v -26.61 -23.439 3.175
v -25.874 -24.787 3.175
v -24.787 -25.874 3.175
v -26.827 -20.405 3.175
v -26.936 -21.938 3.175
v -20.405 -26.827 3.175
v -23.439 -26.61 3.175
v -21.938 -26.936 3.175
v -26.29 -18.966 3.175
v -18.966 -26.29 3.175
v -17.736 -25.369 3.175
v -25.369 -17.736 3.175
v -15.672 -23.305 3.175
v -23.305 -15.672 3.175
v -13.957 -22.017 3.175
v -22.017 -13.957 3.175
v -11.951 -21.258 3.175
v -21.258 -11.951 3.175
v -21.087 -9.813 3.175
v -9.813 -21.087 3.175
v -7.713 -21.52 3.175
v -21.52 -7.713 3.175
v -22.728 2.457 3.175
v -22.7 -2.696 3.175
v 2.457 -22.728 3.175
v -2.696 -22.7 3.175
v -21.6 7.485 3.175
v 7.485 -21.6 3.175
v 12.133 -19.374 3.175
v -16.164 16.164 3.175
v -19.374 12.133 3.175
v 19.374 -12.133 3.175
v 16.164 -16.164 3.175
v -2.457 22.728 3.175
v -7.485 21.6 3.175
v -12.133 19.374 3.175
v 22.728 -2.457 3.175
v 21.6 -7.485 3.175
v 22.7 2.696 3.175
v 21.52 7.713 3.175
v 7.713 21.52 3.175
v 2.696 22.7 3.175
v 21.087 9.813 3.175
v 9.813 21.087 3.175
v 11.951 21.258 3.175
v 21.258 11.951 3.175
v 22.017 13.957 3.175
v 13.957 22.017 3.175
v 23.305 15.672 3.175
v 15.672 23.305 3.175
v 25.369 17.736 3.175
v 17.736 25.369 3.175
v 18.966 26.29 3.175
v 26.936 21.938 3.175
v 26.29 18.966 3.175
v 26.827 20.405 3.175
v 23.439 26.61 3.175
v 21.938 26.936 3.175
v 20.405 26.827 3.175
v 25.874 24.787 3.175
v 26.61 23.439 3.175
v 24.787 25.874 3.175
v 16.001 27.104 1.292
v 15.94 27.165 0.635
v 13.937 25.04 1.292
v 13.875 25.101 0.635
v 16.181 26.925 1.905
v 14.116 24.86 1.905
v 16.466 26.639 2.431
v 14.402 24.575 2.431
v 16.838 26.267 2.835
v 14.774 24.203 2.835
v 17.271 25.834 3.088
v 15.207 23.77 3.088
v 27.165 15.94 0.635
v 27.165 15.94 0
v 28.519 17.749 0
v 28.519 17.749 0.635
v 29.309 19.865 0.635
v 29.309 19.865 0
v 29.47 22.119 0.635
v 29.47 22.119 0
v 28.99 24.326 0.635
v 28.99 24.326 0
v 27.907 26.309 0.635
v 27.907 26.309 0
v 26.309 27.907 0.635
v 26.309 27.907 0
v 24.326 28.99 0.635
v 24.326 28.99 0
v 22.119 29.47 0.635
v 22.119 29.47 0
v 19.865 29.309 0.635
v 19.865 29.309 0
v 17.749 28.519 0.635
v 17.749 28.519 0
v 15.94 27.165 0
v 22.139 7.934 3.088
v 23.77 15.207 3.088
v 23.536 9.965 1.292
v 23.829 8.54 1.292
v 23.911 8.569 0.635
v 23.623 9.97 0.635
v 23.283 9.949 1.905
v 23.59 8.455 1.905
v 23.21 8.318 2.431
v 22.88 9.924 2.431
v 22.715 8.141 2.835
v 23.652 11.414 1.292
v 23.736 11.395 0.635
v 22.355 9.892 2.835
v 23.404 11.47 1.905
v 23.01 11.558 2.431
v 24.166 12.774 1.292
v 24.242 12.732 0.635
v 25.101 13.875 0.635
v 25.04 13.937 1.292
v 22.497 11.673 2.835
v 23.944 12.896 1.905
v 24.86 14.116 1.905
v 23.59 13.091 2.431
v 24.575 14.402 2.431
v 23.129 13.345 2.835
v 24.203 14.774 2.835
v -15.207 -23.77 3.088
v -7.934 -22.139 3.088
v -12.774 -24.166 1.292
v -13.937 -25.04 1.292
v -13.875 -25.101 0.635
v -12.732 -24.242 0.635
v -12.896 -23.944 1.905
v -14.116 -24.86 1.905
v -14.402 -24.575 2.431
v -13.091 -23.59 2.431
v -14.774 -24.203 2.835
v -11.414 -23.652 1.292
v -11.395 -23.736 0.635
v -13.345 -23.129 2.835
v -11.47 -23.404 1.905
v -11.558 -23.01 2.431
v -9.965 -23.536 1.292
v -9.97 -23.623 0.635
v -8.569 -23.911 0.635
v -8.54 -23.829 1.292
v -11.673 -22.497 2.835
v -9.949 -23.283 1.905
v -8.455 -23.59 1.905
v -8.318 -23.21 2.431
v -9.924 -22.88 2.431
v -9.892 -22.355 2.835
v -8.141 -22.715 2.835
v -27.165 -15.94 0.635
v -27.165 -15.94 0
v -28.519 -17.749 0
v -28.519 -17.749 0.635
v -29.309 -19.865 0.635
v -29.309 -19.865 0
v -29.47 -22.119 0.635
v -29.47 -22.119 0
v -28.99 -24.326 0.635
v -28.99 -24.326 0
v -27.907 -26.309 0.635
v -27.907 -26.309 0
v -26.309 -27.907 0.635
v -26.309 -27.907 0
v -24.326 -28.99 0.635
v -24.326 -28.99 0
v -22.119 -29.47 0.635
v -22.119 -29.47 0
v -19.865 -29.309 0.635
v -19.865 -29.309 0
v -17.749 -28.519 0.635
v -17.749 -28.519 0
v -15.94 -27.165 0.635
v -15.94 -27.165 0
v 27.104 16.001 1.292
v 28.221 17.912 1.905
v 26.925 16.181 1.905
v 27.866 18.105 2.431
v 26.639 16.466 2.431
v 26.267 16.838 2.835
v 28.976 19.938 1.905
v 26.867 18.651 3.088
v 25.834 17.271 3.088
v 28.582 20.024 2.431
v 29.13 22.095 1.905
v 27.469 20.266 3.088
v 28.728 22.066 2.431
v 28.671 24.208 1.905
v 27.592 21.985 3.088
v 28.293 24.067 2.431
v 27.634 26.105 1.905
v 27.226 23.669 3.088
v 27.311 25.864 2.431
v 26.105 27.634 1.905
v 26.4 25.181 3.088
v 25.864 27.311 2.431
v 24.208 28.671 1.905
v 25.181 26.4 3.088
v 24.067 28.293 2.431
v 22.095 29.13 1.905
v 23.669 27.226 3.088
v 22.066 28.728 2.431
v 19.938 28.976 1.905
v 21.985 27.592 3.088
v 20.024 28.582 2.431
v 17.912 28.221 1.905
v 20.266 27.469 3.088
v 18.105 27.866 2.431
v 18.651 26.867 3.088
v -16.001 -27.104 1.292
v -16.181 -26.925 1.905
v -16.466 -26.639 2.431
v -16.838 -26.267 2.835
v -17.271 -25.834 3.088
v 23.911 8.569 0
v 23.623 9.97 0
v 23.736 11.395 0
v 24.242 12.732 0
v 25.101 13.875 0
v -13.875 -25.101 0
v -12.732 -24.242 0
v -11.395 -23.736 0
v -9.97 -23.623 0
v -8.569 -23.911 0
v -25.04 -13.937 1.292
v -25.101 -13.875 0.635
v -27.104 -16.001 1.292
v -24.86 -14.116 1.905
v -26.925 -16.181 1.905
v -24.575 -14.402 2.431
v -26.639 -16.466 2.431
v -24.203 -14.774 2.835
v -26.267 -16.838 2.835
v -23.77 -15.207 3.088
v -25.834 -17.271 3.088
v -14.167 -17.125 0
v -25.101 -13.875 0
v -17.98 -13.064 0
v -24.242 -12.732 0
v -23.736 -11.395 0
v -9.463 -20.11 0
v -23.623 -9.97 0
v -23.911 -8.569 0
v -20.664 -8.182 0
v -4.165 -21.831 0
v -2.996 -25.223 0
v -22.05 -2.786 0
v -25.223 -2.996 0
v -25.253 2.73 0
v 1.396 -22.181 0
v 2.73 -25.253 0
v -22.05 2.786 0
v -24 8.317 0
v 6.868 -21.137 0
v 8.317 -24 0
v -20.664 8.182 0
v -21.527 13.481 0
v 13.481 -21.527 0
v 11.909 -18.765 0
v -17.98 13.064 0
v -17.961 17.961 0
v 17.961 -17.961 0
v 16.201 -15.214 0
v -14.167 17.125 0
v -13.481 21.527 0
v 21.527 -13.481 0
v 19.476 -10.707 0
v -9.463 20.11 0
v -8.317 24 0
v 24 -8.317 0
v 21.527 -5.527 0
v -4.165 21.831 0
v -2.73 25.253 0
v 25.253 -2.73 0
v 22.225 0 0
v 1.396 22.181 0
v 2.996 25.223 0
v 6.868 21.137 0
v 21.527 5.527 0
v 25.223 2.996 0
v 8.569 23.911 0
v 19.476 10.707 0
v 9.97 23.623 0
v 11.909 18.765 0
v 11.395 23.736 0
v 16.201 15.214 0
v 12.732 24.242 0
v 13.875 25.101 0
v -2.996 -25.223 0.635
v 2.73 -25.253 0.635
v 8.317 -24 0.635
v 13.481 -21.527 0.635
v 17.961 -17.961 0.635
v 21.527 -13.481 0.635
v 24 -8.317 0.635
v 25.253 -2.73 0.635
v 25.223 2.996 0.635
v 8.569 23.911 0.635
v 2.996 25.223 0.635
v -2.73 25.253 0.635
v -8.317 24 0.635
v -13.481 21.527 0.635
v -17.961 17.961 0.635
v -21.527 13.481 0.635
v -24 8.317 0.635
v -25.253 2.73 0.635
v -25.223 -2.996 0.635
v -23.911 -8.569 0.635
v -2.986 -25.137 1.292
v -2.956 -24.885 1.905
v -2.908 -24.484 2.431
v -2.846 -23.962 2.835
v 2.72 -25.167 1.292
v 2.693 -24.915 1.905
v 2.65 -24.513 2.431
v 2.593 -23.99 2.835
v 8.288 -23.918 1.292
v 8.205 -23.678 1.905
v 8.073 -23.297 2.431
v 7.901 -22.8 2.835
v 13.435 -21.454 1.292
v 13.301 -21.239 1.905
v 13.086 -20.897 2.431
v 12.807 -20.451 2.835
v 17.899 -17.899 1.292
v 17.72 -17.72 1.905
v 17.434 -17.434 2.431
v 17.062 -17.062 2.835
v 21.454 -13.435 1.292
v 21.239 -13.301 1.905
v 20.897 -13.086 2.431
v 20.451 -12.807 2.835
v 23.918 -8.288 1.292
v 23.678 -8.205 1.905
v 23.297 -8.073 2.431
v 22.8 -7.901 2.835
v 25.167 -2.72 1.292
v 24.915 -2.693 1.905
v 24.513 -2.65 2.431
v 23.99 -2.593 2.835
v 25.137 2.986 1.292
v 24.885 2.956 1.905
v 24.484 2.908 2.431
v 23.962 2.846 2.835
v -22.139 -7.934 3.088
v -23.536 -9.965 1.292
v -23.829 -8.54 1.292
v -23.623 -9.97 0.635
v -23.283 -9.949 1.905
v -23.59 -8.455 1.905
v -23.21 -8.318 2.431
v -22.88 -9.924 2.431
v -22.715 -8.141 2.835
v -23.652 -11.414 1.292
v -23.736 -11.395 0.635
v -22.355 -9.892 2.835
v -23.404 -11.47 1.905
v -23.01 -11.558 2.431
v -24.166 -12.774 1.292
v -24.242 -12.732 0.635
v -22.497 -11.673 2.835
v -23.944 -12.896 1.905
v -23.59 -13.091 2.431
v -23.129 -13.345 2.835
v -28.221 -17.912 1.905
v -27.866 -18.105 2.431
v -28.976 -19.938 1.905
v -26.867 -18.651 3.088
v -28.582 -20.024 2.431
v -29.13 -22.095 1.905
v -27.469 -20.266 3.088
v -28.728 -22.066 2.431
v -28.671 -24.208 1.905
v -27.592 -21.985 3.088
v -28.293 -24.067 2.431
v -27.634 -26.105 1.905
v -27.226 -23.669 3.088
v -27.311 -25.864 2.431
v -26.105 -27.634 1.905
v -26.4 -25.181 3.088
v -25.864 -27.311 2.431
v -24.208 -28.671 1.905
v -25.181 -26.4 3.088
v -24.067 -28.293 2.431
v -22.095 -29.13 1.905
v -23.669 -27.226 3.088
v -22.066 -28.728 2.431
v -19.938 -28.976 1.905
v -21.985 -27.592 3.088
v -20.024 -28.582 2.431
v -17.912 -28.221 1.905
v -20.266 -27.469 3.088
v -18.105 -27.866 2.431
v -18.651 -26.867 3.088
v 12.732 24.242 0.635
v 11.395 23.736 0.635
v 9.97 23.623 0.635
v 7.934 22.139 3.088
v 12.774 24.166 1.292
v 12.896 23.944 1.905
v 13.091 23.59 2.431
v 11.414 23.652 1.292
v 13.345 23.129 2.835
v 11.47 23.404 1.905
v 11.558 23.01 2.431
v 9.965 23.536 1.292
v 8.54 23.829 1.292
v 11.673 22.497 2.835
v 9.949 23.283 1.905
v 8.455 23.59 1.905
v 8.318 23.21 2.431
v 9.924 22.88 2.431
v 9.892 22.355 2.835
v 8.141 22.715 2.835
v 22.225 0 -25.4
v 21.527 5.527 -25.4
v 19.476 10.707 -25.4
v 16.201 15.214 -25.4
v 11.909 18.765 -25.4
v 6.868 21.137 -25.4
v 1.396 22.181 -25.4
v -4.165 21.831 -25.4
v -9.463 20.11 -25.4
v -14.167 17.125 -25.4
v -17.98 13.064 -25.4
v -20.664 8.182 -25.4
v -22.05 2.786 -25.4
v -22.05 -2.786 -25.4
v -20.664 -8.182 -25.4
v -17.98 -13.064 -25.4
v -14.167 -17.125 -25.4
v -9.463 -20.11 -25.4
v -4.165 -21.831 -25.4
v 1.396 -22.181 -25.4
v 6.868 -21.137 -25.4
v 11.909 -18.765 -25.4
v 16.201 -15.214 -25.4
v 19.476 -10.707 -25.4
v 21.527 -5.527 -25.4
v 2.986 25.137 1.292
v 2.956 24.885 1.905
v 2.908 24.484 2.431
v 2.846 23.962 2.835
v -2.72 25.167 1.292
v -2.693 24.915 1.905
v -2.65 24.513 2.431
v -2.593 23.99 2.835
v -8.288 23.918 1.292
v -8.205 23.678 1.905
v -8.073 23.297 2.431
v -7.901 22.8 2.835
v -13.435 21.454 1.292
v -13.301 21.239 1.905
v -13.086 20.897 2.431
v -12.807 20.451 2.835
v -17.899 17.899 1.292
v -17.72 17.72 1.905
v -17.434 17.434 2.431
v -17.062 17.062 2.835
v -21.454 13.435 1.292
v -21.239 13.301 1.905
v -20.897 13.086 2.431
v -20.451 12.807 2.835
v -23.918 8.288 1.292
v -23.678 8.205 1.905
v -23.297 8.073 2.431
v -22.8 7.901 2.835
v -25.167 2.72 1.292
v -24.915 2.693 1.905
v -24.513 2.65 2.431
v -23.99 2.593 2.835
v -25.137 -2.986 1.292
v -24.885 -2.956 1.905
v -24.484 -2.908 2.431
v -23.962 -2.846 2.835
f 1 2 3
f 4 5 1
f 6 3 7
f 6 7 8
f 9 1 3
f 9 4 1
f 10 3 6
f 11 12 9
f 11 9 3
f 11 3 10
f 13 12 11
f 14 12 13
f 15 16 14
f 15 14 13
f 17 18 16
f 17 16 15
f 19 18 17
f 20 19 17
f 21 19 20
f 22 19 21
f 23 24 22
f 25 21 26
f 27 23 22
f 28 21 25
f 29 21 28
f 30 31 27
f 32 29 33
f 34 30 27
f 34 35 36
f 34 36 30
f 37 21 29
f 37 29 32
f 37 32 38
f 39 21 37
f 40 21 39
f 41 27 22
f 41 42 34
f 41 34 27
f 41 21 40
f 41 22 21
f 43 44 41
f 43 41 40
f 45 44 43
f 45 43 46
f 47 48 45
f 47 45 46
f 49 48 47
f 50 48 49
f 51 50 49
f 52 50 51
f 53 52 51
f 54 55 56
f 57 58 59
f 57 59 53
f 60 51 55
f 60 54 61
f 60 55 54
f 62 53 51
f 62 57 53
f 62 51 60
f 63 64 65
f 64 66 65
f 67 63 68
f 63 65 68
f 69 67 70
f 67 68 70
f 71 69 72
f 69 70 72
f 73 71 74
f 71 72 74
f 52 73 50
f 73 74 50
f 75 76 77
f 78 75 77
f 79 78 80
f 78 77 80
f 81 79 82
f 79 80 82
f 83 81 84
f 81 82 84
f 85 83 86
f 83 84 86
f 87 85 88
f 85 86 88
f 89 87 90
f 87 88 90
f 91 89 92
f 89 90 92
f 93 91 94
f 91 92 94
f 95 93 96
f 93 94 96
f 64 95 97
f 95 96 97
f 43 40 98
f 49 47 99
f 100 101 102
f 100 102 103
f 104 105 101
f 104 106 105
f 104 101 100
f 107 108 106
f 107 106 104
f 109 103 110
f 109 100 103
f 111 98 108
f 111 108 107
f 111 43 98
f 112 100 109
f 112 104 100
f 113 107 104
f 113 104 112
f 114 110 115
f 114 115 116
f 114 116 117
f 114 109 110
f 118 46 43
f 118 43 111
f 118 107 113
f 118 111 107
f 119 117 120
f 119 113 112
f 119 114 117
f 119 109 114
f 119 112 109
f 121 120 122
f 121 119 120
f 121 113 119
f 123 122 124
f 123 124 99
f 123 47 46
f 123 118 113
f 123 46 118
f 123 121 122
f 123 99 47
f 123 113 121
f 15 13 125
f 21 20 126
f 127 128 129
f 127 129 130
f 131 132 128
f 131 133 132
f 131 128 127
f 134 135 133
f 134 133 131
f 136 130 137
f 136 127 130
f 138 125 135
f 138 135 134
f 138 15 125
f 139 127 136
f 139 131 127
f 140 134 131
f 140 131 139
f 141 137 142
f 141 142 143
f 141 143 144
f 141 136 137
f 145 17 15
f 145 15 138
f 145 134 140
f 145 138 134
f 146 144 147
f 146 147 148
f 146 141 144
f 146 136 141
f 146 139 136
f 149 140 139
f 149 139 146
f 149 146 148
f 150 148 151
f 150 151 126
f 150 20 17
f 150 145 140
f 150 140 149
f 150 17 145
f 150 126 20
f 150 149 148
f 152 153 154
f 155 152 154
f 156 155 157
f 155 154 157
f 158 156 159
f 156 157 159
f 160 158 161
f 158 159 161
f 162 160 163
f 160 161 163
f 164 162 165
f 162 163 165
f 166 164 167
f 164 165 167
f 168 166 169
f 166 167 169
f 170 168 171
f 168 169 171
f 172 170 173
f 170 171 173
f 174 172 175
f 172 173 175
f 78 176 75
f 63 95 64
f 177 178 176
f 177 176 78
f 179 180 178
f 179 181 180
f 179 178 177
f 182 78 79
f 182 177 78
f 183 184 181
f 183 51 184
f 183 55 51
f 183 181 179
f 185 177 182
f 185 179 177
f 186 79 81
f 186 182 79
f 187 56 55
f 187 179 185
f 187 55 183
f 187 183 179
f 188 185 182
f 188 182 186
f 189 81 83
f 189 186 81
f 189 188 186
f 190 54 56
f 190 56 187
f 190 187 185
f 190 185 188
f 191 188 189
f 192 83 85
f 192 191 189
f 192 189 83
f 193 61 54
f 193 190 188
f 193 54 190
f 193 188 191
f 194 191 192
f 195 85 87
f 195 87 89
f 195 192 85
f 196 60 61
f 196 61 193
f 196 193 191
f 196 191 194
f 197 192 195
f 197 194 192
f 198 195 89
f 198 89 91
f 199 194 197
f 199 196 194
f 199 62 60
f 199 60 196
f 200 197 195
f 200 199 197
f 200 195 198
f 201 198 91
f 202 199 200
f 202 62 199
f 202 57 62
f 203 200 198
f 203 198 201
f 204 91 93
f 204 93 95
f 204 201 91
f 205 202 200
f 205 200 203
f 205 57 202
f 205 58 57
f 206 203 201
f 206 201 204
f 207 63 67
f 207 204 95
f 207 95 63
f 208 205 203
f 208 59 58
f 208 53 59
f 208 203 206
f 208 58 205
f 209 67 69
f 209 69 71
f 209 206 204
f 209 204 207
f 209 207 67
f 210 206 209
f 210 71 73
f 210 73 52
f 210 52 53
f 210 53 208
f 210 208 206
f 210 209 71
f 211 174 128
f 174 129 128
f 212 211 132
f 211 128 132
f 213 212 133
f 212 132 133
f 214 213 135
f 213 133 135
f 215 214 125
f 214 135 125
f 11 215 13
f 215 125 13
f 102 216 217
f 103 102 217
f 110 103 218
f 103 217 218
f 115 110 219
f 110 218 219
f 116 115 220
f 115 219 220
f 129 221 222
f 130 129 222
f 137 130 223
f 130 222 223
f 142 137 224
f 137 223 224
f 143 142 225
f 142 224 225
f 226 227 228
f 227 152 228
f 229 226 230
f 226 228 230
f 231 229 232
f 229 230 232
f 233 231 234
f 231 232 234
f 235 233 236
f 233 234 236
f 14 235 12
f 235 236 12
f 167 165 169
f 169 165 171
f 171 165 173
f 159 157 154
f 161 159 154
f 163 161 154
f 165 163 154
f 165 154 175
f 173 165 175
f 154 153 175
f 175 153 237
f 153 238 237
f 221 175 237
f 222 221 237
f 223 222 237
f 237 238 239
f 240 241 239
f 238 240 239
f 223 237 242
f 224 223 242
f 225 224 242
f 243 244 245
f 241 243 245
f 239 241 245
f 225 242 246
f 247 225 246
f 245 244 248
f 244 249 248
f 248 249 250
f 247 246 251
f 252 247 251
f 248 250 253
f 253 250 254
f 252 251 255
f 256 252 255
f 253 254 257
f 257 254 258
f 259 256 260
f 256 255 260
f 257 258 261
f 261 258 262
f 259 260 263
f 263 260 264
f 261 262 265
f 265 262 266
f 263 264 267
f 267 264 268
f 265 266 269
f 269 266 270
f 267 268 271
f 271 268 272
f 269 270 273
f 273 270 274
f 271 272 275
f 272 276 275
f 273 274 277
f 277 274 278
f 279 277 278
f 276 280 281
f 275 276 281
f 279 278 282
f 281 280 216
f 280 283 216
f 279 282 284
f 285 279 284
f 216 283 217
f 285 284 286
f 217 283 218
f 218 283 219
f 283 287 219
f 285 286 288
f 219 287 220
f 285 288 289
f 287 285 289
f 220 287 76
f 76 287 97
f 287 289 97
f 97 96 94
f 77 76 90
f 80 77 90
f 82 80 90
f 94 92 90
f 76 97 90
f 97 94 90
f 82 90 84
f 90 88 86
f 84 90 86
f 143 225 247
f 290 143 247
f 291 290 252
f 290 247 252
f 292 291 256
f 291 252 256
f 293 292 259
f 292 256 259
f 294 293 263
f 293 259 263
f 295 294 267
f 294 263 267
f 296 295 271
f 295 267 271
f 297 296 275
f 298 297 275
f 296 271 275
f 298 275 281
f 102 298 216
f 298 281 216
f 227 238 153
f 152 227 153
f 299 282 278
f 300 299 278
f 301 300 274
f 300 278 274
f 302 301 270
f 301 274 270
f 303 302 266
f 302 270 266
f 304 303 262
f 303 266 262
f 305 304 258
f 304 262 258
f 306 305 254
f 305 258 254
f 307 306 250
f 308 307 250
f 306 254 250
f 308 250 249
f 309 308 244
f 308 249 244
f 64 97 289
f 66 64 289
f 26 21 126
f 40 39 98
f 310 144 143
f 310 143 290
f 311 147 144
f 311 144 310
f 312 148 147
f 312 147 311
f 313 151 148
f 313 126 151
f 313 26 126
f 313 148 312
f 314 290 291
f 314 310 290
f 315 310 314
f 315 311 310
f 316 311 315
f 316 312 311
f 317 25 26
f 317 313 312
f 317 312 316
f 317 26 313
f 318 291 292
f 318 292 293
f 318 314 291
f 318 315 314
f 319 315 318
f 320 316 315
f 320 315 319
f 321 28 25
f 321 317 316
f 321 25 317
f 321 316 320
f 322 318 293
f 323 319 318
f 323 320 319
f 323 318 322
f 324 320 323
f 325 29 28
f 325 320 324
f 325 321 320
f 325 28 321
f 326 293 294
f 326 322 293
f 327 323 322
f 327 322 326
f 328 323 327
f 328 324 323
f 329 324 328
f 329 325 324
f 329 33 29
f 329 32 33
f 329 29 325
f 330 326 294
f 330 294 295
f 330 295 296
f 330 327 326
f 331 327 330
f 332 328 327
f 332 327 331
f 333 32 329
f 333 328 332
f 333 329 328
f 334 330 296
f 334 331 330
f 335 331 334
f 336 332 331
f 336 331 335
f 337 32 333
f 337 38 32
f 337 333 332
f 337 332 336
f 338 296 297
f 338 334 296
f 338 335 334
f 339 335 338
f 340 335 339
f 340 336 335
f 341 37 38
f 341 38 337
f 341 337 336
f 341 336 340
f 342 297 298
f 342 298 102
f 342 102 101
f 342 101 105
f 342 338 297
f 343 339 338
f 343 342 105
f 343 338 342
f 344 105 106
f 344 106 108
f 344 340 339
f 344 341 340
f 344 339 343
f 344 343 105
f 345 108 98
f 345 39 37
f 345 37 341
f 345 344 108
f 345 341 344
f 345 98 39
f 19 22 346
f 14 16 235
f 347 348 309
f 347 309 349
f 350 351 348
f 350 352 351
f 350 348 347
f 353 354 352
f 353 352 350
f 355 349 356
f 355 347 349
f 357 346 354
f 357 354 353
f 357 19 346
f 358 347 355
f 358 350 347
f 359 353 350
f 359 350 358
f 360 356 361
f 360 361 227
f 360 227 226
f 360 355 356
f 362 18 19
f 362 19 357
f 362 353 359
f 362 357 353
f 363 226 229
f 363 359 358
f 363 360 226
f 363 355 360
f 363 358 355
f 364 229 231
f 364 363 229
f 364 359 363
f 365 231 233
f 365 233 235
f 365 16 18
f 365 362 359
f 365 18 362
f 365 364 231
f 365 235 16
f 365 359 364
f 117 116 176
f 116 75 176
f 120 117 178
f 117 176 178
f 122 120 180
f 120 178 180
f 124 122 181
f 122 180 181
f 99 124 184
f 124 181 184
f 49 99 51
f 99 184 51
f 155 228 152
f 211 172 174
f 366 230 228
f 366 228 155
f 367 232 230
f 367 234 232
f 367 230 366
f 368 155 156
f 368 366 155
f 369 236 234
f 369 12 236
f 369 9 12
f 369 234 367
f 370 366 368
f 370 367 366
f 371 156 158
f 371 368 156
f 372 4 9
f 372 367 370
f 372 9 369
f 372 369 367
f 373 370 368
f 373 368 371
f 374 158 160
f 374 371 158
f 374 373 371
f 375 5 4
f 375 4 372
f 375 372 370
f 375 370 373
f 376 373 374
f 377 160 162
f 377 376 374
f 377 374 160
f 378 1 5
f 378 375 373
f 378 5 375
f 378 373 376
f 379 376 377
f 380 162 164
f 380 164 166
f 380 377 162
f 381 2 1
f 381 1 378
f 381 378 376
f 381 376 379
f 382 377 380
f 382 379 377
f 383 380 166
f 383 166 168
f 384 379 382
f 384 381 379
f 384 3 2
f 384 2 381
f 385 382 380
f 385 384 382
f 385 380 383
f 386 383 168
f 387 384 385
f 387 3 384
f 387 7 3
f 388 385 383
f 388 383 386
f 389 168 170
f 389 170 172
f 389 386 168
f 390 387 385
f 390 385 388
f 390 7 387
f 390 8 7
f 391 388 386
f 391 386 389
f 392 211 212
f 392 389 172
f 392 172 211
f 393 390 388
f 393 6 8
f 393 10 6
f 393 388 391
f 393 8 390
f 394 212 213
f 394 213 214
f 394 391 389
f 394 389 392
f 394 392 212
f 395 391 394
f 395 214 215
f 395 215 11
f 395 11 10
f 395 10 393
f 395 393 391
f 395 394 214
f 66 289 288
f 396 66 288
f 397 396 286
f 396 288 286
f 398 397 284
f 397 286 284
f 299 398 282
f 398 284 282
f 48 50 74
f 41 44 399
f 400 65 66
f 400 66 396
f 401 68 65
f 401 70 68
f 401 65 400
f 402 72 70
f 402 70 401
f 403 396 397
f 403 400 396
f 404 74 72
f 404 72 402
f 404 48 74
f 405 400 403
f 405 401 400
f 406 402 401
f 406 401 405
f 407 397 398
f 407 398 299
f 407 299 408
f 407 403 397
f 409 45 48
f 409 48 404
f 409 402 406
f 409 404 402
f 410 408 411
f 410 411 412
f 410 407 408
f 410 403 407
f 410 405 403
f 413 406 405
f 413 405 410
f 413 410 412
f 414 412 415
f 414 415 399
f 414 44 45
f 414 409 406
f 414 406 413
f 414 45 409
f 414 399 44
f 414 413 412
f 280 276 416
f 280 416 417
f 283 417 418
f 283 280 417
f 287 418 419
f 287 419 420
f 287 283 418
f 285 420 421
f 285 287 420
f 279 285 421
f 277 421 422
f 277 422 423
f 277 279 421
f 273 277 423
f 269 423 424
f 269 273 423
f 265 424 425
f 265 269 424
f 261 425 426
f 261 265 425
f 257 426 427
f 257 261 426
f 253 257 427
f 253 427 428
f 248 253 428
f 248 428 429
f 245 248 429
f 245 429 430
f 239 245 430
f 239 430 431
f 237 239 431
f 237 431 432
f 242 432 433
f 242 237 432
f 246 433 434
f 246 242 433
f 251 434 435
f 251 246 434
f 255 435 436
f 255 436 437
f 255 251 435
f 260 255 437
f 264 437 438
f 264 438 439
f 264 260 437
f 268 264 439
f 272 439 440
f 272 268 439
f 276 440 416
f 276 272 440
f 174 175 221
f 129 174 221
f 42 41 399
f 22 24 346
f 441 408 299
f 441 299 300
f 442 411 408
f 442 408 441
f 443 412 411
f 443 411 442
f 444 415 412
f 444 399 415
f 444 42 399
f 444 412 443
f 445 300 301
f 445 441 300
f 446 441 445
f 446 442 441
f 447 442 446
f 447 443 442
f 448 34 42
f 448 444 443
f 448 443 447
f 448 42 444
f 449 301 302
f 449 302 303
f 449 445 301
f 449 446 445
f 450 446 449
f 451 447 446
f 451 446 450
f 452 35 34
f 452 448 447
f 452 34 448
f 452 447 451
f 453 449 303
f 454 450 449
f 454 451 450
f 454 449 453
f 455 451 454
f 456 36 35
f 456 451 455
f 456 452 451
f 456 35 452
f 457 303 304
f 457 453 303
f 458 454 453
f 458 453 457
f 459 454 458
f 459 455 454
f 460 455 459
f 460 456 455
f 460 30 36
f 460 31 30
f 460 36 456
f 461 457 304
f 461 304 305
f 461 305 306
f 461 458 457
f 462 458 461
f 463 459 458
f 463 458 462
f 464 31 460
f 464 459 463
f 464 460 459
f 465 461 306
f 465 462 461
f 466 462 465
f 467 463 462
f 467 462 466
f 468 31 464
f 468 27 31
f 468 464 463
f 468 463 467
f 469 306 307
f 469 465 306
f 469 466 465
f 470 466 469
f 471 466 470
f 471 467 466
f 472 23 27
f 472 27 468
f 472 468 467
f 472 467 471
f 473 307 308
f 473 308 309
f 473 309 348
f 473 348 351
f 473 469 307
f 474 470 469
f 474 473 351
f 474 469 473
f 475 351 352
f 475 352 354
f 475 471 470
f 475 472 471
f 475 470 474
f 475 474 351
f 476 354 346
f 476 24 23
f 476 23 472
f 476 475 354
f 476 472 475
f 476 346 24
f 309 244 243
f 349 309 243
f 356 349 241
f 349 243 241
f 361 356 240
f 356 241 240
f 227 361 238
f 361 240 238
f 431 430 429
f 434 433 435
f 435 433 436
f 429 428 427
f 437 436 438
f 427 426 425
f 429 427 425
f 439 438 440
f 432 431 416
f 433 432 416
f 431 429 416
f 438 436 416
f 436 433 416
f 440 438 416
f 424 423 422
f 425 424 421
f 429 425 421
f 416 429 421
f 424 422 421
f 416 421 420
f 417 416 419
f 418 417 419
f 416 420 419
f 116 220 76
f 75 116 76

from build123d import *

# Parameters (mm, degrees)
SKETCH1_R           = 22.225
BOSS_EXTRUDE1_DEPTH = 3.175
FILLET1_R           = 2.54
SKETCH1_3_R         = 22.225
BOSS_EXTRUDE2_DEPTH = 25.4


with BuildPart() as part:
    # Sketch1 → Boss-Extrude1 (new body)
    # profile 1 of 2: a face of its own
    with BuildSketch(Plane.XY):
        with BuildLine():
            Line((25.100798696, 13.875478544), (27.165274766, 15.939954615))
            ThreePointArc((27.165274766, 15.939954615), (27.165274766, 27.165274766), (15.939954615, 27.165274766))
            Line((15.939954615, 27.165274766), (13.875478544, 25.100798696))
            ThreePointArc((13.875478544, 25.100798696), (11.395117189, 23.736044101), (8.56948008, 23.910750953))
            ThreePointArc((8.56948008, 23.910750953), (-17.960512242, 17.960512242), (-23.910750953, -8.56948008))
            ThreePointArc((-23.910750953, -8.56948008), (-23.736044101, -11.395117189), (-25.100798696, -13.875478544))
            Line((-25.100798696, -13.875478544), (-27.165274766, -15.939954615))
            ThreePointArc((-27.165274766, -15.939954615), (-27.165274766, -27.165274766), (-15.939954615, -27.165274766))
            Line((-15.939954615, -27.165274766), (-13.875478544, -25.100798696))
            ThreePointArc((-13.875478544, -25.100798696), (-11.395117189, -23.736044101), (-8.56948008, -23.910750953))
            ThreePointArc((-8.56948008, -23.910750953), (17.960512242, -17.960512242), (23.910750953, 8.56948008))
            ThreePointArc((23.910750953, 8.56948008), (23.736044101, 11.395117189), (25.100798696, 13.875478544))
        make_face()
        Circle(SKETCH1_R, mode=Mode.SUBTRACT)
    # profile 2 of 2: a face of its own
    with BuildSketch(Plane.XY):
        Circle(SKETCH1_R)
    extrude(amount=BOSS_EXTRUDE1_DEPTH)

    # Fillet1
    fillet1_edges = [part.edges().sort_by_distance(p)[0] for p in [
        (27.165274766, 27.165274766, 3.175),
        (14.90771658, 26.133036731, 3.175),
        (11.395117189, 23.736044101, 3.175),
        (-17.960512242, 17.960512242, 3.175),
        (-23.736044101, -11.395117189, 3.175),
        (-26.133036731, -14.90771658, 3.175),
        (-27.165274766, -27.165274766, 3.175),
        (-14.90771658, -26.133036731, 3.175),
        (26.133036731, 14.90771658, 3.175),
        (-11.395117189, -23.736044101, 3.175),
        (17.960512242, -17.960512242, 3.175),
        (23.736044101, 11.395117189, 3.175),
    ]]
    fillet(fillet1_edges, radius=FILLET1_R)

    # Sketch1<3> → Boss-Extrude2 (add)
    with BuildSketch(Plane.XY):
        Circle(SKETCH1_3_R)
    extrude(amount=-BOSS_EXTRUDE2_DEPTH)


solid = part.part
